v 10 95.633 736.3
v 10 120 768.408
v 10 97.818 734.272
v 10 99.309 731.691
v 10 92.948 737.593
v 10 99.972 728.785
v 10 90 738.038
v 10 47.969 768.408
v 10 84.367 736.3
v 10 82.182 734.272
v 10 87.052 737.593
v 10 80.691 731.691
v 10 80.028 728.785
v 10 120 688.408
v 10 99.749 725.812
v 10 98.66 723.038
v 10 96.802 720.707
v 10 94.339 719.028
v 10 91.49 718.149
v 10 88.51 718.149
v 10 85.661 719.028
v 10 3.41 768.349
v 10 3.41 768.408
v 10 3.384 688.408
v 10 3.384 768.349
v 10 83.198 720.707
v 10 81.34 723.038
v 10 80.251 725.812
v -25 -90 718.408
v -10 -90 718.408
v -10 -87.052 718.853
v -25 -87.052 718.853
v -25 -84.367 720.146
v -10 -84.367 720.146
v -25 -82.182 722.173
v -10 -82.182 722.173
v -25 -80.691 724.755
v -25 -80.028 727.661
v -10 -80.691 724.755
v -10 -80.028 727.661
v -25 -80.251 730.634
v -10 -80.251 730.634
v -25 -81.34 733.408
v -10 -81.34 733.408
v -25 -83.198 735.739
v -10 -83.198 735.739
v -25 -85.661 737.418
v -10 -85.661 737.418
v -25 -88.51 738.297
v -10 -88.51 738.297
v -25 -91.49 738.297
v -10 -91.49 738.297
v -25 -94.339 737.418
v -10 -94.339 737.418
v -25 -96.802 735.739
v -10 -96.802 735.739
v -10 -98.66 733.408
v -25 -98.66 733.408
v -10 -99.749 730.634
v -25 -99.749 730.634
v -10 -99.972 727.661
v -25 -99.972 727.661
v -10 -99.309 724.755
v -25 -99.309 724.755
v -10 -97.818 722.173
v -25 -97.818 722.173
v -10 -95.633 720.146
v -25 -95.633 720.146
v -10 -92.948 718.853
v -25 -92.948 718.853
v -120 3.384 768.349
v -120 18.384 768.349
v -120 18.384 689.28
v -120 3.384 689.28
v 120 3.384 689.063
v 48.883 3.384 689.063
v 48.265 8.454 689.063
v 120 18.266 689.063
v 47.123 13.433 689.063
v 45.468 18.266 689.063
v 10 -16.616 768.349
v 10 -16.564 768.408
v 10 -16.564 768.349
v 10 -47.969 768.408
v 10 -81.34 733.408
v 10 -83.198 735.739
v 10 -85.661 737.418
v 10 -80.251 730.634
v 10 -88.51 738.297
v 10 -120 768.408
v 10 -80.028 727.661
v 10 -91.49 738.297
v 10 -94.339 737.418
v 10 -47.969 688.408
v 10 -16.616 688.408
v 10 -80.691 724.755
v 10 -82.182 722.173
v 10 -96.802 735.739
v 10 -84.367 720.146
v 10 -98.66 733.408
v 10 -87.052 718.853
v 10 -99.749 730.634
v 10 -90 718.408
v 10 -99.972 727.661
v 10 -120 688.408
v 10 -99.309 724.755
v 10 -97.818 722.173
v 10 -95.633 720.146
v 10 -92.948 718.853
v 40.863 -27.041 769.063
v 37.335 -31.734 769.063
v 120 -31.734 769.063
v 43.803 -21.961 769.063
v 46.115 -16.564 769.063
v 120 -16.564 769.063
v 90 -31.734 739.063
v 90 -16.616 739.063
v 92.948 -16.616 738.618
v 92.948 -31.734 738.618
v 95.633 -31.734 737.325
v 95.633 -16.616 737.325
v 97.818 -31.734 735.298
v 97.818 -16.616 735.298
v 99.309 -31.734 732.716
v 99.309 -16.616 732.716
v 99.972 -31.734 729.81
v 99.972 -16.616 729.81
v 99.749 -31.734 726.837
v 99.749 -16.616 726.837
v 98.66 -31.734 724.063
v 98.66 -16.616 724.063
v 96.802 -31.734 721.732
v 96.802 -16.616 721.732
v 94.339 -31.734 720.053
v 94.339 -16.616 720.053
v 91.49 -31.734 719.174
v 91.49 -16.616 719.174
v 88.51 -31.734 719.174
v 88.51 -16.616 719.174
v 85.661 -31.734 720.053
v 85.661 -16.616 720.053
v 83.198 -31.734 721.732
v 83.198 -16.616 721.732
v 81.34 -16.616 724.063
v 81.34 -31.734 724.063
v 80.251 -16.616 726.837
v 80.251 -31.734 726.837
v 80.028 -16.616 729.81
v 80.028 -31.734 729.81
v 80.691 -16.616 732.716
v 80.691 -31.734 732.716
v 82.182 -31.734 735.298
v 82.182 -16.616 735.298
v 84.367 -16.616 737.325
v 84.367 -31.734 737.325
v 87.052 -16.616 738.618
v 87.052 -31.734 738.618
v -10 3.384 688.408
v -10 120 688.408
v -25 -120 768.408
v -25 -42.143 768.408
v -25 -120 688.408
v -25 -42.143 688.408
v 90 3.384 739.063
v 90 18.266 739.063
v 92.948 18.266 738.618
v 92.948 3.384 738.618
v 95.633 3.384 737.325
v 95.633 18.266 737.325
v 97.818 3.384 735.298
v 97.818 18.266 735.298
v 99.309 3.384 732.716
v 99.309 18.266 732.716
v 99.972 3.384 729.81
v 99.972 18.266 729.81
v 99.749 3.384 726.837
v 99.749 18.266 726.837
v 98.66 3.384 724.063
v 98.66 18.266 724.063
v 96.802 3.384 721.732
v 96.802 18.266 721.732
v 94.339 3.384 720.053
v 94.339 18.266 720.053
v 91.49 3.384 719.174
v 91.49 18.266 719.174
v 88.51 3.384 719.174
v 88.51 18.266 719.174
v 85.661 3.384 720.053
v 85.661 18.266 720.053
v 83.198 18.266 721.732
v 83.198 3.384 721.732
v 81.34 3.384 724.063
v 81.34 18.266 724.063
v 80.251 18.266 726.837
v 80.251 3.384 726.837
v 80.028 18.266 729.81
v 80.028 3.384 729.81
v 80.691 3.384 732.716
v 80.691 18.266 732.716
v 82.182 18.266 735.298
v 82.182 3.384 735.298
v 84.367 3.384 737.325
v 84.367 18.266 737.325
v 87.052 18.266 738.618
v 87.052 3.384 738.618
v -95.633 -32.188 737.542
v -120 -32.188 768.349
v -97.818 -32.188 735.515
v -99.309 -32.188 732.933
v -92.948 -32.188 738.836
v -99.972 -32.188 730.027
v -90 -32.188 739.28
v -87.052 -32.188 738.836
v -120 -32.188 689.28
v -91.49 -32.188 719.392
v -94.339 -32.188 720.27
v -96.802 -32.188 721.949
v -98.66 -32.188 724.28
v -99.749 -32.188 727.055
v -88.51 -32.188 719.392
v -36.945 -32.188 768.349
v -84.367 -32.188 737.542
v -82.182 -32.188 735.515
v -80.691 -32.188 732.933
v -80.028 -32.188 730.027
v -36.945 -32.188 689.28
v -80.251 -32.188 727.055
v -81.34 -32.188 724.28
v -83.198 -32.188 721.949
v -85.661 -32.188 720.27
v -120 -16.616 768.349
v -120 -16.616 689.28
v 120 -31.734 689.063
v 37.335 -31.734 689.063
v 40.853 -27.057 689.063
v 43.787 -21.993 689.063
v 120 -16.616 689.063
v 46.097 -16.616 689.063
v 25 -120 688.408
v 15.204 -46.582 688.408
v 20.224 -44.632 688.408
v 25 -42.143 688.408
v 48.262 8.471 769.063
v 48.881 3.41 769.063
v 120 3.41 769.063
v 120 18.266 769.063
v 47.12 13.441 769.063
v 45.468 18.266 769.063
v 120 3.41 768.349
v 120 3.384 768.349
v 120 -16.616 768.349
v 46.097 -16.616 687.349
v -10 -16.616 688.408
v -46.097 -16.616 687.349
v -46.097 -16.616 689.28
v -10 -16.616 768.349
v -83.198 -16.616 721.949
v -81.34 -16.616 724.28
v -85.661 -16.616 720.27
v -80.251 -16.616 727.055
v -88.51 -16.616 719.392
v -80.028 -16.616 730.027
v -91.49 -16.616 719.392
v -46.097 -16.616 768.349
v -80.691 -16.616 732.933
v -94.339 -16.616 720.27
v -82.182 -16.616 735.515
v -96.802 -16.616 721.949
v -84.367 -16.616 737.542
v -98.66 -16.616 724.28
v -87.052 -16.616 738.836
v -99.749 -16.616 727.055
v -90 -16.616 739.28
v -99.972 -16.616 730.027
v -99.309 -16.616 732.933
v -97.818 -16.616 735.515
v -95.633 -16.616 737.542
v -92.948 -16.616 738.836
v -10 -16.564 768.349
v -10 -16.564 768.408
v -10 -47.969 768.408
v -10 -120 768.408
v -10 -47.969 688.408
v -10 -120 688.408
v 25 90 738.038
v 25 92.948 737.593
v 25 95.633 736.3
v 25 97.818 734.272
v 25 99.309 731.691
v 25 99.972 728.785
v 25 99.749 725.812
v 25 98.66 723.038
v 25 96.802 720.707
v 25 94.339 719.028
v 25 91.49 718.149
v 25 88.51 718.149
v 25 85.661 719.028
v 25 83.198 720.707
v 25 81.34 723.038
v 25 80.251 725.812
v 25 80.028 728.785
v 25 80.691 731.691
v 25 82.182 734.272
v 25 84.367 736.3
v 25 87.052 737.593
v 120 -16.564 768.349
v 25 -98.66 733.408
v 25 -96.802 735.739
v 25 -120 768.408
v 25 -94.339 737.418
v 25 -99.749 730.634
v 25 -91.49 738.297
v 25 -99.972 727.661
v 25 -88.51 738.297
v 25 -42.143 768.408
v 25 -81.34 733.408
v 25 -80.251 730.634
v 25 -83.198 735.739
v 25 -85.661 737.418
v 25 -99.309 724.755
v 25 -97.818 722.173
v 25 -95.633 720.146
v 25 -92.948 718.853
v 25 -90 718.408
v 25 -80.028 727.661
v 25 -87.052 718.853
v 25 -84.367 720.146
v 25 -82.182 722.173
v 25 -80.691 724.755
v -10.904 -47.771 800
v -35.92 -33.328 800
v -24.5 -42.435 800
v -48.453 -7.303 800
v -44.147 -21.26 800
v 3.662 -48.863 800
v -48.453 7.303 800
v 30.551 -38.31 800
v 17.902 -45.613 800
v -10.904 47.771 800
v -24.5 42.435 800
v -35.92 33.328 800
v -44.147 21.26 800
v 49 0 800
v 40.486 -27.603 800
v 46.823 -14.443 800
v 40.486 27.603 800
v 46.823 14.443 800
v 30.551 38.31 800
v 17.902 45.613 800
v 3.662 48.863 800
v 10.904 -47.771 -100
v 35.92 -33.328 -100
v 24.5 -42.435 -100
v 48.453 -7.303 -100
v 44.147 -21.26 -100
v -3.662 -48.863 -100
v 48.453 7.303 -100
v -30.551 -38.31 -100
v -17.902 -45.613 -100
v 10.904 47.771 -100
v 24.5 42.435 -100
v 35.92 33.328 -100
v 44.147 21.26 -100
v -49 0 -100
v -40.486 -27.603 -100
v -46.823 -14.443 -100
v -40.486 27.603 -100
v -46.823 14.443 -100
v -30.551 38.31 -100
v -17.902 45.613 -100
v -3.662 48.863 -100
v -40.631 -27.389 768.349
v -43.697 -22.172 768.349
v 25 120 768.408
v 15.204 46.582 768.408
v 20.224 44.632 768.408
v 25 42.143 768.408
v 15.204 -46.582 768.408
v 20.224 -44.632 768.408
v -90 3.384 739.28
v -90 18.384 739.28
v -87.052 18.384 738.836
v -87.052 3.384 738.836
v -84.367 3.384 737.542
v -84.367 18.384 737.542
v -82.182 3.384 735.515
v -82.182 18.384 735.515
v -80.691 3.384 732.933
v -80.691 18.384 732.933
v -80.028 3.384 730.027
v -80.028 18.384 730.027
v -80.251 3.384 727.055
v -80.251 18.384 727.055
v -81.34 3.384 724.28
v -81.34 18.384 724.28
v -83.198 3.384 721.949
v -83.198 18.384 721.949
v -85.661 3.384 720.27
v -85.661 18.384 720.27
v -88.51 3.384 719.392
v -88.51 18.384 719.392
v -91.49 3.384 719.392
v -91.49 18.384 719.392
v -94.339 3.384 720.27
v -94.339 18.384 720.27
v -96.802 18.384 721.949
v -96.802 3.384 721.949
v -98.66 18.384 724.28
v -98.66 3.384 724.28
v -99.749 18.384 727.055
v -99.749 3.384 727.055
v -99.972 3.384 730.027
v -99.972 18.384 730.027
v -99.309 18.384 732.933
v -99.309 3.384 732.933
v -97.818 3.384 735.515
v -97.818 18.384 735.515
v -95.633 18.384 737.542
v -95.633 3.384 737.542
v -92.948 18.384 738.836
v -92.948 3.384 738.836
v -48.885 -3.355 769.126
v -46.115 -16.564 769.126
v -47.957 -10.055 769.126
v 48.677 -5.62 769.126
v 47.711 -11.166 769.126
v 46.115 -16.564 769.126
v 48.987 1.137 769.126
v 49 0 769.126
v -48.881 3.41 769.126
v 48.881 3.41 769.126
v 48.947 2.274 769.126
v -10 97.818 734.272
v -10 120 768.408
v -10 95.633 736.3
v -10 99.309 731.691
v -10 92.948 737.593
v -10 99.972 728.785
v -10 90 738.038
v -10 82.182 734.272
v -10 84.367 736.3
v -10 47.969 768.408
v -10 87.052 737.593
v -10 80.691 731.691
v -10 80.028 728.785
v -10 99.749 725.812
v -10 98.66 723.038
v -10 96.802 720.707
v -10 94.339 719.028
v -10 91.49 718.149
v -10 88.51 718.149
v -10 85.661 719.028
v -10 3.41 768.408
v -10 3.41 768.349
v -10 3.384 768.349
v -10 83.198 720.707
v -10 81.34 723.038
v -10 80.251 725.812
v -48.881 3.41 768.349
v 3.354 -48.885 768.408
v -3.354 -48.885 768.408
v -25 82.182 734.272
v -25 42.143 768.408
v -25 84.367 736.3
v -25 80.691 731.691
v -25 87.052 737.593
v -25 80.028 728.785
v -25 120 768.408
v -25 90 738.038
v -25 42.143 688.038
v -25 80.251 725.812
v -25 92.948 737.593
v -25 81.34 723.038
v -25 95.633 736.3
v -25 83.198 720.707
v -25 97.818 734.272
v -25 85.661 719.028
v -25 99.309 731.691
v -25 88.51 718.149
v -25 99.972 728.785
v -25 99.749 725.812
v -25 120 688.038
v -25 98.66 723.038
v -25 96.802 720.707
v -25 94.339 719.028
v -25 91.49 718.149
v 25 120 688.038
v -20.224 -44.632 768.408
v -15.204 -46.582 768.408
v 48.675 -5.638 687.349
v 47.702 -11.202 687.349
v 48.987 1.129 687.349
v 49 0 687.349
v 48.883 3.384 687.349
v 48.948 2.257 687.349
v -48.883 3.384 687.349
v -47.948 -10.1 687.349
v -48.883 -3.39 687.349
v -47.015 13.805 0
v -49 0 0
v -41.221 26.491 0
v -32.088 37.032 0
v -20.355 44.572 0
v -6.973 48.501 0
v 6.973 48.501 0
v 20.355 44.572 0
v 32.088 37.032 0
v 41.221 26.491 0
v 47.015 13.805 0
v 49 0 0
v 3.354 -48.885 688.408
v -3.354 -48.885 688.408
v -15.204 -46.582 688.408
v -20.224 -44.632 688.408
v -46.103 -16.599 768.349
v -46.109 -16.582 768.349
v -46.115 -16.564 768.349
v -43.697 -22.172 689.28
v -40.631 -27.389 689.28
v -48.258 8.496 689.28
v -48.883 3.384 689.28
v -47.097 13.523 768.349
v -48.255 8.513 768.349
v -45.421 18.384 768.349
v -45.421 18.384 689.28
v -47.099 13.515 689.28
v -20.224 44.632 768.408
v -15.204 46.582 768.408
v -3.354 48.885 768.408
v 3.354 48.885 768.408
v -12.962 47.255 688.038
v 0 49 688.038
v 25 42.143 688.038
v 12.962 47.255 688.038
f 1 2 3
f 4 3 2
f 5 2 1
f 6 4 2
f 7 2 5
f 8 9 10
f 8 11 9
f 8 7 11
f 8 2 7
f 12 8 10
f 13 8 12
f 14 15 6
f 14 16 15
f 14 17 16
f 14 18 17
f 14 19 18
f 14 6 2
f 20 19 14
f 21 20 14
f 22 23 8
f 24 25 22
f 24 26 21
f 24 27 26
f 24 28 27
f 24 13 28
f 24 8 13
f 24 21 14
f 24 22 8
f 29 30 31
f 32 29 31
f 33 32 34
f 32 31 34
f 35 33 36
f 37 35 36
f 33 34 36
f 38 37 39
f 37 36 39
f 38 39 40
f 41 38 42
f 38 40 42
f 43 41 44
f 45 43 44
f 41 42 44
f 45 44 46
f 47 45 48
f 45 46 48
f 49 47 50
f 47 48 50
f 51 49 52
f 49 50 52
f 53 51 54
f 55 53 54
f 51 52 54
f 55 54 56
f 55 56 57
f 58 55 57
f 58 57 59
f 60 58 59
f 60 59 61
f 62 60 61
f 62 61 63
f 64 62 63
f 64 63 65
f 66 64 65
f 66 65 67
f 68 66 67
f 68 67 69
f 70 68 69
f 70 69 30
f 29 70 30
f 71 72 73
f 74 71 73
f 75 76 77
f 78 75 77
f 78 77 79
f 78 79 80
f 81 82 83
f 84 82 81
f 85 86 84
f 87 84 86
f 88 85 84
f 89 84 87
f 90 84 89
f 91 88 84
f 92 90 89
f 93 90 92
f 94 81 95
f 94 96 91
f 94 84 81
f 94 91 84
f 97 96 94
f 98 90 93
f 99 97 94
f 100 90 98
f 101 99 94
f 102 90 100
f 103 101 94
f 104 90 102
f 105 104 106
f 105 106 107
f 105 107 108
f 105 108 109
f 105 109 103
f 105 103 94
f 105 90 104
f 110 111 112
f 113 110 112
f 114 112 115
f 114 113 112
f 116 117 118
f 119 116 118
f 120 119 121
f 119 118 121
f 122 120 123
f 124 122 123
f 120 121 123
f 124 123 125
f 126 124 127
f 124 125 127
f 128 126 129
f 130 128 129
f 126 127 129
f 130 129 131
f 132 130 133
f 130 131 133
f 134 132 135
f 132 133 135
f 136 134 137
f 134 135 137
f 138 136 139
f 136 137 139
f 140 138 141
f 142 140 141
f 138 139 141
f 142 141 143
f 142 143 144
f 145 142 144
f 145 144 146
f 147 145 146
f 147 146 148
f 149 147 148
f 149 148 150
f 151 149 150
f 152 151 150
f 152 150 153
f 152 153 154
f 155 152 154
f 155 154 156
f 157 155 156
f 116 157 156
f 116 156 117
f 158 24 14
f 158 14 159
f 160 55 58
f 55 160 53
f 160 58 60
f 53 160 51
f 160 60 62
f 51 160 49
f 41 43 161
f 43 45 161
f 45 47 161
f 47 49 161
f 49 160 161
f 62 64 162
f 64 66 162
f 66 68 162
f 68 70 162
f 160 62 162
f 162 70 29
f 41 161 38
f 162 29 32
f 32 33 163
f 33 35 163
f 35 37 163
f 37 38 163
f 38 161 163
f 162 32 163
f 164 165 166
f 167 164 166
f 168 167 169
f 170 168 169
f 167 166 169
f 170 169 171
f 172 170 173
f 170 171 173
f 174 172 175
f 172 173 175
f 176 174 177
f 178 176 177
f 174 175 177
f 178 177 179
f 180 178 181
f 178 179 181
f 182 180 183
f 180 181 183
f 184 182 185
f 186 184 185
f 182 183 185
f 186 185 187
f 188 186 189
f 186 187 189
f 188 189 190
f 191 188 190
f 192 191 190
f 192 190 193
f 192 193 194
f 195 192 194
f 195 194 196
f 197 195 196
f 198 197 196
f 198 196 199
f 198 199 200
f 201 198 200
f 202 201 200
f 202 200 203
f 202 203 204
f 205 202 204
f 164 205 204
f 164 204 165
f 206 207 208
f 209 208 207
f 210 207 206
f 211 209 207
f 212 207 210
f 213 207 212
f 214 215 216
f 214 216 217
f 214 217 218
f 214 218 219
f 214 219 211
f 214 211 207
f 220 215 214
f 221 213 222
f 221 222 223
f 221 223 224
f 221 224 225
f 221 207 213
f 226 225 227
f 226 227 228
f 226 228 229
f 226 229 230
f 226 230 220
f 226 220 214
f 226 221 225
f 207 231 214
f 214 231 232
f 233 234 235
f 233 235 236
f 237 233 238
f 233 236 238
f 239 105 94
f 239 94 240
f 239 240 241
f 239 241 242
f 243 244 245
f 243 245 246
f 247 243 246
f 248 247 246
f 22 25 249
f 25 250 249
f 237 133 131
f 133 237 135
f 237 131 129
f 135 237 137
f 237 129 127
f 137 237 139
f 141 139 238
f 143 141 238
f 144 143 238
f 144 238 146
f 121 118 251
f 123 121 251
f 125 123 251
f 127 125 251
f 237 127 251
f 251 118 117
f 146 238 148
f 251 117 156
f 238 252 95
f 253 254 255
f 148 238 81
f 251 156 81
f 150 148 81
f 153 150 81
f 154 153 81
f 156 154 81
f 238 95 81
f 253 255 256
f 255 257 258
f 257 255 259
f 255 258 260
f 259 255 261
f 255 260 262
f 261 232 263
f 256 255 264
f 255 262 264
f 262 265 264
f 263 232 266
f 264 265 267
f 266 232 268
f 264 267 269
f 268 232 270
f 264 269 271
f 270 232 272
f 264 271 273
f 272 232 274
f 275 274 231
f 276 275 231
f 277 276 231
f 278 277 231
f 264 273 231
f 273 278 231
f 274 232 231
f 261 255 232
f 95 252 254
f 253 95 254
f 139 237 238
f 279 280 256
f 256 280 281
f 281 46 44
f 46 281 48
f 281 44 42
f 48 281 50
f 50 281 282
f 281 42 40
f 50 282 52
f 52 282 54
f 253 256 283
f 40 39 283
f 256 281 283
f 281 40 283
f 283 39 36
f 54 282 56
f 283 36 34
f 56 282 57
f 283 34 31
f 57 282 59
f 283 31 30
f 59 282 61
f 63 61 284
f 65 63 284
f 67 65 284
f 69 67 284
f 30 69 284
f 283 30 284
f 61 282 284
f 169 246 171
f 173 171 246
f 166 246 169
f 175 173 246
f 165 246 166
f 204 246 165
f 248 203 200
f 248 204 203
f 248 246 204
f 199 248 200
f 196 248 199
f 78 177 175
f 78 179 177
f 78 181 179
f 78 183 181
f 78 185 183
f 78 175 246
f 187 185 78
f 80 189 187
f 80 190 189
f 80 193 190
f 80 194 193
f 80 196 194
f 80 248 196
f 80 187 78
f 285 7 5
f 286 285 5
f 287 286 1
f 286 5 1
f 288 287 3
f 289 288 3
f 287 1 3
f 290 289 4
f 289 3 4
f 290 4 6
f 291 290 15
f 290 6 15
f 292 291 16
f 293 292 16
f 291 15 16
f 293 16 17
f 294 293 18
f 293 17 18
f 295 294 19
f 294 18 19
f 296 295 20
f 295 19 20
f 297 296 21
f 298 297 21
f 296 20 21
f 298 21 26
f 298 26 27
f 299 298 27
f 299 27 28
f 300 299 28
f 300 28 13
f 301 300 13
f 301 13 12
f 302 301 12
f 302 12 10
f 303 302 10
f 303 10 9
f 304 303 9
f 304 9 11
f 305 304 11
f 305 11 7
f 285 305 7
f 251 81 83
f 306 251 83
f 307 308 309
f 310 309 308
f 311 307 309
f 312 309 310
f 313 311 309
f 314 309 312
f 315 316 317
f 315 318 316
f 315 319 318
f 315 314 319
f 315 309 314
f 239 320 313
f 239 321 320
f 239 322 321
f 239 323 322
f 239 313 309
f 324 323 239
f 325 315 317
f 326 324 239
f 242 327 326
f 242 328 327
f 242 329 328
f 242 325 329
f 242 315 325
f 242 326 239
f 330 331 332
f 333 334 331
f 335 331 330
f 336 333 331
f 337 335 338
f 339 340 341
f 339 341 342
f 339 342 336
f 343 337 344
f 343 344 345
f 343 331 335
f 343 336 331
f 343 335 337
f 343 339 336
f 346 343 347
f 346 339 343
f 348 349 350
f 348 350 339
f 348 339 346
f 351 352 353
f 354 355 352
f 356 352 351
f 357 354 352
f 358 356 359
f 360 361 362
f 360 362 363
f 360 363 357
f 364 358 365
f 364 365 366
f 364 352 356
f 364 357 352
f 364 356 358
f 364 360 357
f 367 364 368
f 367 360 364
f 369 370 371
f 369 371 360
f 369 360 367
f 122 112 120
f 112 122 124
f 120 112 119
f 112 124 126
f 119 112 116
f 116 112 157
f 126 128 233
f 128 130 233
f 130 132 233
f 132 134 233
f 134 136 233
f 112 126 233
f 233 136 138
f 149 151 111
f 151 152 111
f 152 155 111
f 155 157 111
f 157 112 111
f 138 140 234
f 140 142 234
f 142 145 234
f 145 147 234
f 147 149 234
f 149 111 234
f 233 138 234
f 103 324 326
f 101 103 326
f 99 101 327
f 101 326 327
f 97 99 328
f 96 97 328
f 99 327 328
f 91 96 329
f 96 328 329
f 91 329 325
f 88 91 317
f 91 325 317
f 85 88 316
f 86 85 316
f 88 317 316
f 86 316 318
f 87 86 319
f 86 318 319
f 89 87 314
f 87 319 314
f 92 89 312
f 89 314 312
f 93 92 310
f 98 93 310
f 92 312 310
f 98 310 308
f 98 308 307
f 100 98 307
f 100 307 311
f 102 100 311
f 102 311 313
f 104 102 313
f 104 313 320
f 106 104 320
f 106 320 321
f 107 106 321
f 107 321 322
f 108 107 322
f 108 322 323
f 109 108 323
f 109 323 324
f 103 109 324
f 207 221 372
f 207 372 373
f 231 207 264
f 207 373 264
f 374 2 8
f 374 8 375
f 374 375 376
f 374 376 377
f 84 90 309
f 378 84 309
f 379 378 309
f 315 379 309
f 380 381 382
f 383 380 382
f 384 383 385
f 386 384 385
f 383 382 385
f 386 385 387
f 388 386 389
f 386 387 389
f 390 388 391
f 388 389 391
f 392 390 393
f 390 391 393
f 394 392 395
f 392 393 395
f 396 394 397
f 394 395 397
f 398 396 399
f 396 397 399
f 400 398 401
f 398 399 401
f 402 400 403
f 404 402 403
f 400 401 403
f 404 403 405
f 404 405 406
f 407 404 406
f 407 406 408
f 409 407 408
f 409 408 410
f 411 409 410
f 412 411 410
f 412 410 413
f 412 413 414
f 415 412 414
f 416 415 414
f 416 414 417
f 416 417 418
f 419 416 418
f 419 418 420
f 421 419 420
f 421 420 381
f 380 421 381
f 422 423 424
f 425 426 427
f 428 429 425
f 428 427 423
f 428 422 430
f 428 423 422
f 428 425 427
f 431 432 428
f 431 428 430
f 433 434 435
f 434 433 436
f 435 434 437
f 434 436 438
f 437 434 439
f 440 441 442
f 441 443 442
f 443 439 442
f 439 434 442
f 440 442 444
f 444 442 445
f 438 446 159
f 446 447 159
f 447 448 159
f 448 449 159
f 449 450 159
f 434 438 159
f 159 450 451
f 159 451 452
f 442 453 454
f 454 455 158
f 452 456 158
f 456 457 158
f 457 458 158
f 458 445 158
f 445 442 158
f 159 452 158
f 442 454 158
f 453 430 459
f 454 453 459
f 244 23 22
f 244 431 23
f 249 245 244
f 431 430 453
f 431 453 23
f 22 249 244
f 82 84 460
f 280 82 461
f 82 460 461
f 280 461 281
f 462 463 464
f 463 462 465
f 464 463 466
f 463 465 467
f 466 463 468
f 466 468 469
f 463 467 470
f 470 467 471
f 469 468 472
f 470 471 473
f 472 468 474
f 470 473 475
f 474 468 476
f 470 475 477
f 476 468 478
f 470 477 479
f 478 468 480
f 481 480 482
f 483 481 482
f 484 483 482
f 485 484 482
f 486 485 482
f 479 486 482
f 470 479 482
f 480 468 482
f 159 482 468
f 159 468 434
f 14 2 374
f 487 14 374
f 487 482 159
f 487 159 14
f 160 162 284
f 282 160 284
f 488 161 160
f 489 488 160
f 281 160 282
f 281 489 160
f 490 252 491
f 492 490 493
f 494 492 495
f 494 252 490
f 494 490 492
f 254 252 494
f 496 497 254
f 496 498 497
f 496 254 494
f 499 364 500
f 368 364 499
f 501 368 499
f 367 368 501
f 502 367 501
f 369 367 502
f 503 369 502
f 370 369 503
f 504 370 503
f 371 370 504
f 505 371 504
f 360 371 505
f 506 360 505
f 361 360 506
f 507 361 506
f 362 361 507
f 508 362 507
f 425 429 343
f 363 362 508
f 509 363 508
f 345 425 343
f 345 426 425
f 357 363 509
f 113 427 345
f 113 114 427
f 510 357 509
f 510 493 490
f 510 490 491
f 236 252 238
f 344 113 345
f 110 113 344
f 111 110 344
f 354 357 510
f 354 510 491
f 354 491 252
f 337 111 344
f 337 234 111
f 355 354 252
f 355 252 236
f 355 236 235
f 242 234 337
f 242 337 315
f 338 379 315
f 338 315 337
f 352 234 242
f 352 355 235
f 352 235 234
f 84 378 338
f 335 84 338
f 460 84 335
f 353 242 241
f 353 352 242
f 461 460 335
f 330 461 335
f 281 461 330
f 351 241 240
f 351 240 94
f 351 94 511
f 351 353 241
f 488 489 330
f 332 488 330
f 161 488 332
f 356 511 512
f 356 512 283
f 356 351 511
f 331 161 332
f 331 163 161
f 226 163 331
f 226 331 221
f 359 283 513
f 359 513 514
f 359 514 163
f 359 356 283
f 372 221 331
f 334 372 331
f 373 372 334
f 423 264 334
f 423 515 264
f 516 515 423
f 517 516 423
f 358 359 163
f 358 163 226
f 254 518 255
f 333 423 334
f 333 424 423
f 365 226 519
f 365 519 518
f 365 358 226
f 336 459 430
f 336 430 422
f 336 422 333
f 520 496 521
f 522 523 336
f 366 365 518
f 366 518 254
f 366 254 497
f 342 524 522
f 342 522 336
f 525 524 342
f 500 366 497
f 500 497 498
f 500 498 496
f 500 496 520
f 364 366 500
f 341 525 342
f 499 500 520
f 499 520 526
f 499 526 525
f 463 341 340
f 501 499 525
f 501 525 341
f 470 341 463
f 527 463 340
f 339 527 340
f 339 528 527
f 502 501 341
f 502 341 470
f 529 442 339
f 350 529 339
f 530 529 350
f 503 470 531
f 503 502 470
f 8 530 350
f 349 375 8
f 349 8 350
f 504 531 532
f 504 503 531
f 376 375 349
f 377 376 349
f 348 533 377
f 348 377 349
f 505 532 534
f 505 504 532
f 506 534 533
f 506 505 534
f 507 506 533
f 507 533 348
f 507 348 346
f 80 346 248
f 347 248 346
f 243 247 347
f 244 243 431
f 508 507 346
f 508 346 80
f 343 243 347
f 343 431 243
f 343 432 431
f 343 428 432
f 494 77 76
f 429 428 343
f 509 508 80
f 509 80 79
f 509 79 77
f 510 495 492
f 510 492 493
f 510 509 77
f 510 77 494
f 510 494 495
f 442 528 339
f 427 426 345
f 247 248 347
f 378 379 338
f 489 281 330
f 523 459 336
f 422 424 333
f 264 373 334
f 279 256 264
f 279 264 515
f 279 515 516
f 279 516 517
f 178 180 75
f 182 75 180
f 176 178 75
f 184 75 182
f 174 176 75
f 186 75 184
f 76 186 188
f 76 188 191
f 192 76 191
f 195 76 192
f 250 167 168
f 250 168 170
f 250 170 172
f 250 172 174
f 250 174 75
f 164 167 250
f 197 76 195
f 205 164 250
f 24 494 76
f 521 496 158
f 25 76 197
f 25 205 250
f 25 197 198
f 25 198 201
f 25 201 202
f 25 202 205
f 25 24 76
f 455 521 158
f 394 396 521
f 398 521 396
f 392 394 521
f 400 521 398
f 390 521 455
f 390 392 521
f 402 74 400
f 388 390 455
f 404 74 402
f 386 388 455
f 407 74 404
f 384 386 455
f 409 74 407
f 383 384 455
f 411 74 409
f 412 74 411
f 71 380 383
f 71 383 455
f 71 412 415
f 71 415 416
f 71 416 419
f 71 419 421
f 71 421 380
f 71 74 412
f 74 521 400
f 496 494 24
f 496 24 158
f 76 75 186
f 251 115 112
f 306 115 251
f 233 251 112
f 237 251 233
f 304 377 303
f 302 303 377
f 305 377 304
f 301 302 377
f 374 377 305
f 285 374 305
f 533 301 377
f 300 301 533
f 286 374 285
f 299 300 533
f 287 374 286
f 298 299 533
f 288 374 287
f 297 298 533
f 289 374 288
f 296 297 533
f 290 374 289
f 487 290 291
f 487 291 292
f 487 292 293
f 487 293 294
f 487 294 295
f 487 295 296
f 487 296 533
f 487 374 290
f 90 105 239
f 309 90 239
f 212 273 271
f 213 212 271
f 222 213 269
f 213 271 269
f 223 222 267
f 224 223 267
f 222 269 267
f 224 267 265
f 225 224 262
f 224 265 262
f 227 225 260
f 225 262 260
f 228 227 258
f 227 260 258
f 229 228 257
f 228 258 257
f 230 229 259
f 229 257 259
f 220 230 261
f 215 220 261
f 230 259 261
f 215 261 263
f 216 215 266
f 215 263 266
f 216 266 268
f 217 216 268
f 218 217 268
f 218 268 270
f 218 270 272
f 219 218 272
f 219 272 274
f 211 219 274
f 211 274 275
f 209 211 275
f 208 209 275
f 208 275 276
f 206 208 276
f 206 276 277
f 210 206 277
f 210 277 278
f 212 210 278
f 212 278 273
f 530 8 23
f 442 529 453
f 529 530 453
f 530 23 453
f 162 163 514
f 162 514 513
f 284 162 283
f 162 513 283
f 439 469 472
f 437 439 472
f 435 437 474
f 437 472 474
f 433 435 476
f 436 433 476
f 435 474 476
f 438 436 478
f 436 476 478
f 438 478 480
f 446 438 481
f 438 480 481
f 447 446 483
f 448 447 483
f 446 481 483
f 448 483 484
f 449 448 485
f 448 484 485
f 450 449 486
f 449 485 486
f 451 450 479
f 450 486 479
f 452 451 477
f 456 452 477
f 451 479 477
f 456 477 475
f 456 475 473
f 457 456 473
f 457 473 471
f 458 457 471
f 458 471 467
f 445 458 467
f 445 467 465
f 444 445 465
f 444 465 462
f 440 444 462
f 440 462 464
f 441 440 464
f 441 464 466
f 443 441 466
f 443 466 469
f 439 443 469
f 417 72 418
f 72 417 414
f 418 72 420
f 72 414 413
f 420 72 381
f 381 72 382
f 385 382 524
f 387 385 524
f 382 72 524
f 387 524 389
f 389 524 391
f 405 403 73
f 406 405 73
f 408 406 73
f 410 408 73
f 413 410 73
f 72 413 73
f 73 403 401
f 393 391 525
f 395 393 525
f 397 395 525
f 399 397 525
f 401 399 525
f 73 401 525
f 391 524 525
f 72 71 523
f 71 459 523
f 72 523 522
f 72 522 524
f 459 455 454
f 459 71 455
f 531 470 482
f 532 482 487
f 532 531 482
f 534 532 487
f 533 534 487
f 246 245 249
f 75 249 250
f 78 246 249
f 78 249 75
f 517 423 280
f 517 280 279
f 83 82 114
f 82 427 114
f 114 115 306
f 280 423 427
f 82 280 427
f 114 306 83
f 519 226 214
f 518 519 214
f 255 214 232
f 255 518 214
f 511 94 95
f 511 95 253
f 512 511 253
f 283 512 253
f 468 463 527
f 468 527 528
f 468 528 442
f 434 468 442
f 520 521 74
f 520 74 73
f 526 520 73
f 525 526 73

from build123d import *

# Parameters (mm, degrees)
SKETCH_1_R           = 49
EXTRUDE_1_DEPTH      = 800
SKETCH_6_W           = 80
SKETCH_6_H           = 50
EXTRUDE_4_DEPTH      = 120
SKETCH_7_W           = 79.068992587
SKETCH_7_H           = 50.572115984
EXTRUDE_5_DEPTH      = 120
SKETCH_8_W           = 50
SKETCH_8_H           = 80
EXTRUDE_6_DEPTH      = 120
SKETCH_11_W          = 50
SKETCH_11_H          = 80
EXTRUDE_7_DEPTH      = 240
SKETCH_12_W          = 81
SKETCH_12_H          = 20
CUT_EXTRUDE_2_DEPTH  = 240
SKETCH_13_W          = 0.776791224
SKETCH_13_H          = 19.974152477
CUT_EXTRUDE_3_DEPTH  = 240
SKETCH_14_W          = 20
SKETCH_14_H          = 80
CUT_EXTRUDE_4_DEPTH  = 240
SKETCH_15_R          = 10
CUT_EXTRUDE_5_DEPTH  = 240
SKETCH_16_R          = 10
CUT_EXTRUDE_7_DEPTH  = 240
SKETCH_17_R          = 10
CUT_EXTRUDE_8_DEPTH  = 240
SKETCH_18_R          = 10
CUT_EXTRUDE_9_DEPTH  = 240
SKETCH_20_R          = 49
EXTRUDE_11_DEPTH     = 600
SKETCH_19_R          = 37.31025629
CUT_EXTRUDE_10_DEPTH = 818.80193201
CUT_EXTRUDE_START    = -600
SKETCH_21_R          = 49
CUT_EXTRUDE_11_DEPTH = 600
EXTRUDE_START        = 600
SKETCH_22_R          = 49
EXTRUDE_12_DEPTH     = 600
SKETCH_23_R          = 49
CUT_EXTRUDE_13_DEPTH = 500


with BuildPart() as part:
    # 草图1 → 凸台-拉伸1 (new body)
    with BuildSketch(Plane.XY):
        Circle(SKETCH_1_R)
    extrude(amount=EXTRUDE_1_DEPTH)

    # 草图6 → 凸台-拉伸4 (add)
    with BuildSketch(Plane(origin=(0, 0, 0), x_dir=(0, 0, -1), z_dir=(1, 0, 0))):
        with Locations((-729.062639013, -6.734256512)):
            Rectangle(SKETCH_6_W, SKETCH_6_H)
    extrude(amount=EXTRUDE_4_DEPTH)

    # 草图7 → 凸台-拉伸5 (add)
    with BuildSketch(Plane(origin=(0, 0, 0), x_dir=(0, 0, -1), z_dir=(1, 0, 0))):
        with Locations((-728.814319263, -6.902168752)):
            Rectangle(SKETCH_7_W, SKETCH_7_H)
    extrude(amount=-EXTRUDE_5_DEPTH)

    # 草图8 → 凸台-拉伸6 (add)
    with BuildSketch(Plane(origin=(0, 0, 0), x_dir=(1, 0, 0), z_dir=(0, 1, 0))):
        with Locations((0, -728.037522505)):
            Rectangle(SKETCH_8_W, SKETCH_8_H)
    extrude(amount=EXTRUDE_6_DEPTH)

    # 草图11 → 凸台-拉伸7 (add)
    with BuildSketch(Plane(origin=(0, 120, 0), x_dir=(1, 0, 0), z_dir=(0, 1, 0))):
        with Locations((0, -728.408363968)):
            Rectangle(SKETCH_11_W, SKETCH_11_H)
    extrude(amount=-EXTRUDE_7_DEPTH)

    # 草图12 → 切除-拉伸2 (cut)
    with BuildSketch(Plane.ZY.offset(120)):
        with Locations((727.848815556, -6.61611076)):
            Rectangle(SKETCH_12_W, SKETCH_12_H)
    extrude(amount=-CUT_EXTRUDE_2_DEPTH, mode=Mode.SUBTRACT)

    # 草图13 → 切除-拉伸3 (cut)
    with BuildSketch(Plane(origin=(120, 0, 0), x_dir=(0, 0, -1), z_dir=(1, 0, 0))):
        with Locations((-768.737211168, -6.577297247)):
            Rectangle(SKETCH_13_W, SKETCH_13_H)
    extrude(amount=-CUT_EXTRUDE_3_DEPTH, mode=Mode.SUBTRACT)

    # 草图14 → 切除-拉伸4 (cut)
    with BuildSketch(Plane(origin=(0, -120, 0), x_dir=(-1, 0, 0), z_dir=(0, -1, 0))):
        with Locations((0, -728.408363968)):
            Rectangle(SKETCH_14_W, SKETCH_14_H)
    extrude(amount=-CUT_EXTRUDE_4_DEPTH, mode=Mode.SUBTRACT)

    # 草图15 → 切除-拉伸5 (cut)
    with BuildSketch(Plane(origin=(0, 18.38388924, 0), x_dir=(1, 0, 0), z_dir=(0, 1, 0))):
        with Locations(Location((-90, -729.279822969, 0), (0, 0, 270))):
            Circle(SKETCH_15_R)
    extrude(amount=-CUT_EXTRUDE_5_DEPTH, mode=Mode.SUBTRACT)

    # 草图16 → 切除-拉伸7 (cut)
    with BuildSketch(Plane.ZY.offset(25)):
        with Locations((728.037522505, 90)):
            Circle(SKETCH_16_R)
    extrude(amount=-CUT_EXTRUDE_7_DEPTH, mode=Mode.SUBTRACT)

    # 草图17 → 切除-拉伸8 (cut)
    with BuildSketch(Plane(origin=(0, 18.265743488, 0), x_dir=(1, 0, 0), z_dir=(0, 1, 0))):
        with Locations(Location((90, -729.062639013, 0), (0, 0, 270))):
            Circle(SKETCH_17_R)
    extrude(amount=-CUT_EXTRUDE_8_DEPTH, mode=Mode.SUBTRACT)

    # 草图18 → 切除-拉伸9 (cut)
    with BuildSketch(Plane(origin=(25, 0, 0), x_dir=(0, 0, -1), z_dir=(1, 0, 0))):
        with Locations((-728.408363968, -90)):
            Circle(SKETCH_18_R)
    extrude(amount=-CUT_EXTRUDE_9_DEPTH, mode=Mode.SUBTRACT)

    # 草图20 → 凸台-拉伸11 (add)
    with BuildSketch(Plane.XY.offset(800)):
        Circle(SKETCH_20_R)
    extrude(amount=EXTRUDE_11_DEPTH)

    # 草图19 → 切除-拉伸10 (cut, through all)
    with BuildSketch(Plane.XY.offset(800)):
        Circle(SKETCH_19_R)
    extrude(amount=CUT_EXTRUDE_10_DEPTH, mode=Mode.SUBTRACT)

    # 草图21 → 切除-拉伸11 (cut)
    with BuildSketch(Plane.XY.offset(1400).offset(CUT_EXTRUDE_START)):
        Circle(SKETCH_21_R)
    extrude(amount=CUT_EXTRUDE_11_DEPTH, mode=Mode.SUBTRACT)

    # 草图22 → 凸台-拉伸12 (add)
    with BuildSketch(Plane(origin=(0, 0, 0), x_dir=(-1, 0, 0), z_dir=(0, 0, -1)).offset(EXTRUDE_START)):
        Circle(SKETCH_22_R)
    extrude(amount=-EXTRUDE_12_DEPTH)

    # 草图23 → 切除-拉伸13 (cut)
    with BuildSketch(Plane(origin=(0, 0, -600), x_dir=(-1, 0, 0), z_dir=(0, 0, -1))):
        Circle(SKETCH_23_R)
    extrude(amount=-CUT_EXTRUDE_13_DEPTH, mode=Mode.SUBTRACT)


solid = part.part
